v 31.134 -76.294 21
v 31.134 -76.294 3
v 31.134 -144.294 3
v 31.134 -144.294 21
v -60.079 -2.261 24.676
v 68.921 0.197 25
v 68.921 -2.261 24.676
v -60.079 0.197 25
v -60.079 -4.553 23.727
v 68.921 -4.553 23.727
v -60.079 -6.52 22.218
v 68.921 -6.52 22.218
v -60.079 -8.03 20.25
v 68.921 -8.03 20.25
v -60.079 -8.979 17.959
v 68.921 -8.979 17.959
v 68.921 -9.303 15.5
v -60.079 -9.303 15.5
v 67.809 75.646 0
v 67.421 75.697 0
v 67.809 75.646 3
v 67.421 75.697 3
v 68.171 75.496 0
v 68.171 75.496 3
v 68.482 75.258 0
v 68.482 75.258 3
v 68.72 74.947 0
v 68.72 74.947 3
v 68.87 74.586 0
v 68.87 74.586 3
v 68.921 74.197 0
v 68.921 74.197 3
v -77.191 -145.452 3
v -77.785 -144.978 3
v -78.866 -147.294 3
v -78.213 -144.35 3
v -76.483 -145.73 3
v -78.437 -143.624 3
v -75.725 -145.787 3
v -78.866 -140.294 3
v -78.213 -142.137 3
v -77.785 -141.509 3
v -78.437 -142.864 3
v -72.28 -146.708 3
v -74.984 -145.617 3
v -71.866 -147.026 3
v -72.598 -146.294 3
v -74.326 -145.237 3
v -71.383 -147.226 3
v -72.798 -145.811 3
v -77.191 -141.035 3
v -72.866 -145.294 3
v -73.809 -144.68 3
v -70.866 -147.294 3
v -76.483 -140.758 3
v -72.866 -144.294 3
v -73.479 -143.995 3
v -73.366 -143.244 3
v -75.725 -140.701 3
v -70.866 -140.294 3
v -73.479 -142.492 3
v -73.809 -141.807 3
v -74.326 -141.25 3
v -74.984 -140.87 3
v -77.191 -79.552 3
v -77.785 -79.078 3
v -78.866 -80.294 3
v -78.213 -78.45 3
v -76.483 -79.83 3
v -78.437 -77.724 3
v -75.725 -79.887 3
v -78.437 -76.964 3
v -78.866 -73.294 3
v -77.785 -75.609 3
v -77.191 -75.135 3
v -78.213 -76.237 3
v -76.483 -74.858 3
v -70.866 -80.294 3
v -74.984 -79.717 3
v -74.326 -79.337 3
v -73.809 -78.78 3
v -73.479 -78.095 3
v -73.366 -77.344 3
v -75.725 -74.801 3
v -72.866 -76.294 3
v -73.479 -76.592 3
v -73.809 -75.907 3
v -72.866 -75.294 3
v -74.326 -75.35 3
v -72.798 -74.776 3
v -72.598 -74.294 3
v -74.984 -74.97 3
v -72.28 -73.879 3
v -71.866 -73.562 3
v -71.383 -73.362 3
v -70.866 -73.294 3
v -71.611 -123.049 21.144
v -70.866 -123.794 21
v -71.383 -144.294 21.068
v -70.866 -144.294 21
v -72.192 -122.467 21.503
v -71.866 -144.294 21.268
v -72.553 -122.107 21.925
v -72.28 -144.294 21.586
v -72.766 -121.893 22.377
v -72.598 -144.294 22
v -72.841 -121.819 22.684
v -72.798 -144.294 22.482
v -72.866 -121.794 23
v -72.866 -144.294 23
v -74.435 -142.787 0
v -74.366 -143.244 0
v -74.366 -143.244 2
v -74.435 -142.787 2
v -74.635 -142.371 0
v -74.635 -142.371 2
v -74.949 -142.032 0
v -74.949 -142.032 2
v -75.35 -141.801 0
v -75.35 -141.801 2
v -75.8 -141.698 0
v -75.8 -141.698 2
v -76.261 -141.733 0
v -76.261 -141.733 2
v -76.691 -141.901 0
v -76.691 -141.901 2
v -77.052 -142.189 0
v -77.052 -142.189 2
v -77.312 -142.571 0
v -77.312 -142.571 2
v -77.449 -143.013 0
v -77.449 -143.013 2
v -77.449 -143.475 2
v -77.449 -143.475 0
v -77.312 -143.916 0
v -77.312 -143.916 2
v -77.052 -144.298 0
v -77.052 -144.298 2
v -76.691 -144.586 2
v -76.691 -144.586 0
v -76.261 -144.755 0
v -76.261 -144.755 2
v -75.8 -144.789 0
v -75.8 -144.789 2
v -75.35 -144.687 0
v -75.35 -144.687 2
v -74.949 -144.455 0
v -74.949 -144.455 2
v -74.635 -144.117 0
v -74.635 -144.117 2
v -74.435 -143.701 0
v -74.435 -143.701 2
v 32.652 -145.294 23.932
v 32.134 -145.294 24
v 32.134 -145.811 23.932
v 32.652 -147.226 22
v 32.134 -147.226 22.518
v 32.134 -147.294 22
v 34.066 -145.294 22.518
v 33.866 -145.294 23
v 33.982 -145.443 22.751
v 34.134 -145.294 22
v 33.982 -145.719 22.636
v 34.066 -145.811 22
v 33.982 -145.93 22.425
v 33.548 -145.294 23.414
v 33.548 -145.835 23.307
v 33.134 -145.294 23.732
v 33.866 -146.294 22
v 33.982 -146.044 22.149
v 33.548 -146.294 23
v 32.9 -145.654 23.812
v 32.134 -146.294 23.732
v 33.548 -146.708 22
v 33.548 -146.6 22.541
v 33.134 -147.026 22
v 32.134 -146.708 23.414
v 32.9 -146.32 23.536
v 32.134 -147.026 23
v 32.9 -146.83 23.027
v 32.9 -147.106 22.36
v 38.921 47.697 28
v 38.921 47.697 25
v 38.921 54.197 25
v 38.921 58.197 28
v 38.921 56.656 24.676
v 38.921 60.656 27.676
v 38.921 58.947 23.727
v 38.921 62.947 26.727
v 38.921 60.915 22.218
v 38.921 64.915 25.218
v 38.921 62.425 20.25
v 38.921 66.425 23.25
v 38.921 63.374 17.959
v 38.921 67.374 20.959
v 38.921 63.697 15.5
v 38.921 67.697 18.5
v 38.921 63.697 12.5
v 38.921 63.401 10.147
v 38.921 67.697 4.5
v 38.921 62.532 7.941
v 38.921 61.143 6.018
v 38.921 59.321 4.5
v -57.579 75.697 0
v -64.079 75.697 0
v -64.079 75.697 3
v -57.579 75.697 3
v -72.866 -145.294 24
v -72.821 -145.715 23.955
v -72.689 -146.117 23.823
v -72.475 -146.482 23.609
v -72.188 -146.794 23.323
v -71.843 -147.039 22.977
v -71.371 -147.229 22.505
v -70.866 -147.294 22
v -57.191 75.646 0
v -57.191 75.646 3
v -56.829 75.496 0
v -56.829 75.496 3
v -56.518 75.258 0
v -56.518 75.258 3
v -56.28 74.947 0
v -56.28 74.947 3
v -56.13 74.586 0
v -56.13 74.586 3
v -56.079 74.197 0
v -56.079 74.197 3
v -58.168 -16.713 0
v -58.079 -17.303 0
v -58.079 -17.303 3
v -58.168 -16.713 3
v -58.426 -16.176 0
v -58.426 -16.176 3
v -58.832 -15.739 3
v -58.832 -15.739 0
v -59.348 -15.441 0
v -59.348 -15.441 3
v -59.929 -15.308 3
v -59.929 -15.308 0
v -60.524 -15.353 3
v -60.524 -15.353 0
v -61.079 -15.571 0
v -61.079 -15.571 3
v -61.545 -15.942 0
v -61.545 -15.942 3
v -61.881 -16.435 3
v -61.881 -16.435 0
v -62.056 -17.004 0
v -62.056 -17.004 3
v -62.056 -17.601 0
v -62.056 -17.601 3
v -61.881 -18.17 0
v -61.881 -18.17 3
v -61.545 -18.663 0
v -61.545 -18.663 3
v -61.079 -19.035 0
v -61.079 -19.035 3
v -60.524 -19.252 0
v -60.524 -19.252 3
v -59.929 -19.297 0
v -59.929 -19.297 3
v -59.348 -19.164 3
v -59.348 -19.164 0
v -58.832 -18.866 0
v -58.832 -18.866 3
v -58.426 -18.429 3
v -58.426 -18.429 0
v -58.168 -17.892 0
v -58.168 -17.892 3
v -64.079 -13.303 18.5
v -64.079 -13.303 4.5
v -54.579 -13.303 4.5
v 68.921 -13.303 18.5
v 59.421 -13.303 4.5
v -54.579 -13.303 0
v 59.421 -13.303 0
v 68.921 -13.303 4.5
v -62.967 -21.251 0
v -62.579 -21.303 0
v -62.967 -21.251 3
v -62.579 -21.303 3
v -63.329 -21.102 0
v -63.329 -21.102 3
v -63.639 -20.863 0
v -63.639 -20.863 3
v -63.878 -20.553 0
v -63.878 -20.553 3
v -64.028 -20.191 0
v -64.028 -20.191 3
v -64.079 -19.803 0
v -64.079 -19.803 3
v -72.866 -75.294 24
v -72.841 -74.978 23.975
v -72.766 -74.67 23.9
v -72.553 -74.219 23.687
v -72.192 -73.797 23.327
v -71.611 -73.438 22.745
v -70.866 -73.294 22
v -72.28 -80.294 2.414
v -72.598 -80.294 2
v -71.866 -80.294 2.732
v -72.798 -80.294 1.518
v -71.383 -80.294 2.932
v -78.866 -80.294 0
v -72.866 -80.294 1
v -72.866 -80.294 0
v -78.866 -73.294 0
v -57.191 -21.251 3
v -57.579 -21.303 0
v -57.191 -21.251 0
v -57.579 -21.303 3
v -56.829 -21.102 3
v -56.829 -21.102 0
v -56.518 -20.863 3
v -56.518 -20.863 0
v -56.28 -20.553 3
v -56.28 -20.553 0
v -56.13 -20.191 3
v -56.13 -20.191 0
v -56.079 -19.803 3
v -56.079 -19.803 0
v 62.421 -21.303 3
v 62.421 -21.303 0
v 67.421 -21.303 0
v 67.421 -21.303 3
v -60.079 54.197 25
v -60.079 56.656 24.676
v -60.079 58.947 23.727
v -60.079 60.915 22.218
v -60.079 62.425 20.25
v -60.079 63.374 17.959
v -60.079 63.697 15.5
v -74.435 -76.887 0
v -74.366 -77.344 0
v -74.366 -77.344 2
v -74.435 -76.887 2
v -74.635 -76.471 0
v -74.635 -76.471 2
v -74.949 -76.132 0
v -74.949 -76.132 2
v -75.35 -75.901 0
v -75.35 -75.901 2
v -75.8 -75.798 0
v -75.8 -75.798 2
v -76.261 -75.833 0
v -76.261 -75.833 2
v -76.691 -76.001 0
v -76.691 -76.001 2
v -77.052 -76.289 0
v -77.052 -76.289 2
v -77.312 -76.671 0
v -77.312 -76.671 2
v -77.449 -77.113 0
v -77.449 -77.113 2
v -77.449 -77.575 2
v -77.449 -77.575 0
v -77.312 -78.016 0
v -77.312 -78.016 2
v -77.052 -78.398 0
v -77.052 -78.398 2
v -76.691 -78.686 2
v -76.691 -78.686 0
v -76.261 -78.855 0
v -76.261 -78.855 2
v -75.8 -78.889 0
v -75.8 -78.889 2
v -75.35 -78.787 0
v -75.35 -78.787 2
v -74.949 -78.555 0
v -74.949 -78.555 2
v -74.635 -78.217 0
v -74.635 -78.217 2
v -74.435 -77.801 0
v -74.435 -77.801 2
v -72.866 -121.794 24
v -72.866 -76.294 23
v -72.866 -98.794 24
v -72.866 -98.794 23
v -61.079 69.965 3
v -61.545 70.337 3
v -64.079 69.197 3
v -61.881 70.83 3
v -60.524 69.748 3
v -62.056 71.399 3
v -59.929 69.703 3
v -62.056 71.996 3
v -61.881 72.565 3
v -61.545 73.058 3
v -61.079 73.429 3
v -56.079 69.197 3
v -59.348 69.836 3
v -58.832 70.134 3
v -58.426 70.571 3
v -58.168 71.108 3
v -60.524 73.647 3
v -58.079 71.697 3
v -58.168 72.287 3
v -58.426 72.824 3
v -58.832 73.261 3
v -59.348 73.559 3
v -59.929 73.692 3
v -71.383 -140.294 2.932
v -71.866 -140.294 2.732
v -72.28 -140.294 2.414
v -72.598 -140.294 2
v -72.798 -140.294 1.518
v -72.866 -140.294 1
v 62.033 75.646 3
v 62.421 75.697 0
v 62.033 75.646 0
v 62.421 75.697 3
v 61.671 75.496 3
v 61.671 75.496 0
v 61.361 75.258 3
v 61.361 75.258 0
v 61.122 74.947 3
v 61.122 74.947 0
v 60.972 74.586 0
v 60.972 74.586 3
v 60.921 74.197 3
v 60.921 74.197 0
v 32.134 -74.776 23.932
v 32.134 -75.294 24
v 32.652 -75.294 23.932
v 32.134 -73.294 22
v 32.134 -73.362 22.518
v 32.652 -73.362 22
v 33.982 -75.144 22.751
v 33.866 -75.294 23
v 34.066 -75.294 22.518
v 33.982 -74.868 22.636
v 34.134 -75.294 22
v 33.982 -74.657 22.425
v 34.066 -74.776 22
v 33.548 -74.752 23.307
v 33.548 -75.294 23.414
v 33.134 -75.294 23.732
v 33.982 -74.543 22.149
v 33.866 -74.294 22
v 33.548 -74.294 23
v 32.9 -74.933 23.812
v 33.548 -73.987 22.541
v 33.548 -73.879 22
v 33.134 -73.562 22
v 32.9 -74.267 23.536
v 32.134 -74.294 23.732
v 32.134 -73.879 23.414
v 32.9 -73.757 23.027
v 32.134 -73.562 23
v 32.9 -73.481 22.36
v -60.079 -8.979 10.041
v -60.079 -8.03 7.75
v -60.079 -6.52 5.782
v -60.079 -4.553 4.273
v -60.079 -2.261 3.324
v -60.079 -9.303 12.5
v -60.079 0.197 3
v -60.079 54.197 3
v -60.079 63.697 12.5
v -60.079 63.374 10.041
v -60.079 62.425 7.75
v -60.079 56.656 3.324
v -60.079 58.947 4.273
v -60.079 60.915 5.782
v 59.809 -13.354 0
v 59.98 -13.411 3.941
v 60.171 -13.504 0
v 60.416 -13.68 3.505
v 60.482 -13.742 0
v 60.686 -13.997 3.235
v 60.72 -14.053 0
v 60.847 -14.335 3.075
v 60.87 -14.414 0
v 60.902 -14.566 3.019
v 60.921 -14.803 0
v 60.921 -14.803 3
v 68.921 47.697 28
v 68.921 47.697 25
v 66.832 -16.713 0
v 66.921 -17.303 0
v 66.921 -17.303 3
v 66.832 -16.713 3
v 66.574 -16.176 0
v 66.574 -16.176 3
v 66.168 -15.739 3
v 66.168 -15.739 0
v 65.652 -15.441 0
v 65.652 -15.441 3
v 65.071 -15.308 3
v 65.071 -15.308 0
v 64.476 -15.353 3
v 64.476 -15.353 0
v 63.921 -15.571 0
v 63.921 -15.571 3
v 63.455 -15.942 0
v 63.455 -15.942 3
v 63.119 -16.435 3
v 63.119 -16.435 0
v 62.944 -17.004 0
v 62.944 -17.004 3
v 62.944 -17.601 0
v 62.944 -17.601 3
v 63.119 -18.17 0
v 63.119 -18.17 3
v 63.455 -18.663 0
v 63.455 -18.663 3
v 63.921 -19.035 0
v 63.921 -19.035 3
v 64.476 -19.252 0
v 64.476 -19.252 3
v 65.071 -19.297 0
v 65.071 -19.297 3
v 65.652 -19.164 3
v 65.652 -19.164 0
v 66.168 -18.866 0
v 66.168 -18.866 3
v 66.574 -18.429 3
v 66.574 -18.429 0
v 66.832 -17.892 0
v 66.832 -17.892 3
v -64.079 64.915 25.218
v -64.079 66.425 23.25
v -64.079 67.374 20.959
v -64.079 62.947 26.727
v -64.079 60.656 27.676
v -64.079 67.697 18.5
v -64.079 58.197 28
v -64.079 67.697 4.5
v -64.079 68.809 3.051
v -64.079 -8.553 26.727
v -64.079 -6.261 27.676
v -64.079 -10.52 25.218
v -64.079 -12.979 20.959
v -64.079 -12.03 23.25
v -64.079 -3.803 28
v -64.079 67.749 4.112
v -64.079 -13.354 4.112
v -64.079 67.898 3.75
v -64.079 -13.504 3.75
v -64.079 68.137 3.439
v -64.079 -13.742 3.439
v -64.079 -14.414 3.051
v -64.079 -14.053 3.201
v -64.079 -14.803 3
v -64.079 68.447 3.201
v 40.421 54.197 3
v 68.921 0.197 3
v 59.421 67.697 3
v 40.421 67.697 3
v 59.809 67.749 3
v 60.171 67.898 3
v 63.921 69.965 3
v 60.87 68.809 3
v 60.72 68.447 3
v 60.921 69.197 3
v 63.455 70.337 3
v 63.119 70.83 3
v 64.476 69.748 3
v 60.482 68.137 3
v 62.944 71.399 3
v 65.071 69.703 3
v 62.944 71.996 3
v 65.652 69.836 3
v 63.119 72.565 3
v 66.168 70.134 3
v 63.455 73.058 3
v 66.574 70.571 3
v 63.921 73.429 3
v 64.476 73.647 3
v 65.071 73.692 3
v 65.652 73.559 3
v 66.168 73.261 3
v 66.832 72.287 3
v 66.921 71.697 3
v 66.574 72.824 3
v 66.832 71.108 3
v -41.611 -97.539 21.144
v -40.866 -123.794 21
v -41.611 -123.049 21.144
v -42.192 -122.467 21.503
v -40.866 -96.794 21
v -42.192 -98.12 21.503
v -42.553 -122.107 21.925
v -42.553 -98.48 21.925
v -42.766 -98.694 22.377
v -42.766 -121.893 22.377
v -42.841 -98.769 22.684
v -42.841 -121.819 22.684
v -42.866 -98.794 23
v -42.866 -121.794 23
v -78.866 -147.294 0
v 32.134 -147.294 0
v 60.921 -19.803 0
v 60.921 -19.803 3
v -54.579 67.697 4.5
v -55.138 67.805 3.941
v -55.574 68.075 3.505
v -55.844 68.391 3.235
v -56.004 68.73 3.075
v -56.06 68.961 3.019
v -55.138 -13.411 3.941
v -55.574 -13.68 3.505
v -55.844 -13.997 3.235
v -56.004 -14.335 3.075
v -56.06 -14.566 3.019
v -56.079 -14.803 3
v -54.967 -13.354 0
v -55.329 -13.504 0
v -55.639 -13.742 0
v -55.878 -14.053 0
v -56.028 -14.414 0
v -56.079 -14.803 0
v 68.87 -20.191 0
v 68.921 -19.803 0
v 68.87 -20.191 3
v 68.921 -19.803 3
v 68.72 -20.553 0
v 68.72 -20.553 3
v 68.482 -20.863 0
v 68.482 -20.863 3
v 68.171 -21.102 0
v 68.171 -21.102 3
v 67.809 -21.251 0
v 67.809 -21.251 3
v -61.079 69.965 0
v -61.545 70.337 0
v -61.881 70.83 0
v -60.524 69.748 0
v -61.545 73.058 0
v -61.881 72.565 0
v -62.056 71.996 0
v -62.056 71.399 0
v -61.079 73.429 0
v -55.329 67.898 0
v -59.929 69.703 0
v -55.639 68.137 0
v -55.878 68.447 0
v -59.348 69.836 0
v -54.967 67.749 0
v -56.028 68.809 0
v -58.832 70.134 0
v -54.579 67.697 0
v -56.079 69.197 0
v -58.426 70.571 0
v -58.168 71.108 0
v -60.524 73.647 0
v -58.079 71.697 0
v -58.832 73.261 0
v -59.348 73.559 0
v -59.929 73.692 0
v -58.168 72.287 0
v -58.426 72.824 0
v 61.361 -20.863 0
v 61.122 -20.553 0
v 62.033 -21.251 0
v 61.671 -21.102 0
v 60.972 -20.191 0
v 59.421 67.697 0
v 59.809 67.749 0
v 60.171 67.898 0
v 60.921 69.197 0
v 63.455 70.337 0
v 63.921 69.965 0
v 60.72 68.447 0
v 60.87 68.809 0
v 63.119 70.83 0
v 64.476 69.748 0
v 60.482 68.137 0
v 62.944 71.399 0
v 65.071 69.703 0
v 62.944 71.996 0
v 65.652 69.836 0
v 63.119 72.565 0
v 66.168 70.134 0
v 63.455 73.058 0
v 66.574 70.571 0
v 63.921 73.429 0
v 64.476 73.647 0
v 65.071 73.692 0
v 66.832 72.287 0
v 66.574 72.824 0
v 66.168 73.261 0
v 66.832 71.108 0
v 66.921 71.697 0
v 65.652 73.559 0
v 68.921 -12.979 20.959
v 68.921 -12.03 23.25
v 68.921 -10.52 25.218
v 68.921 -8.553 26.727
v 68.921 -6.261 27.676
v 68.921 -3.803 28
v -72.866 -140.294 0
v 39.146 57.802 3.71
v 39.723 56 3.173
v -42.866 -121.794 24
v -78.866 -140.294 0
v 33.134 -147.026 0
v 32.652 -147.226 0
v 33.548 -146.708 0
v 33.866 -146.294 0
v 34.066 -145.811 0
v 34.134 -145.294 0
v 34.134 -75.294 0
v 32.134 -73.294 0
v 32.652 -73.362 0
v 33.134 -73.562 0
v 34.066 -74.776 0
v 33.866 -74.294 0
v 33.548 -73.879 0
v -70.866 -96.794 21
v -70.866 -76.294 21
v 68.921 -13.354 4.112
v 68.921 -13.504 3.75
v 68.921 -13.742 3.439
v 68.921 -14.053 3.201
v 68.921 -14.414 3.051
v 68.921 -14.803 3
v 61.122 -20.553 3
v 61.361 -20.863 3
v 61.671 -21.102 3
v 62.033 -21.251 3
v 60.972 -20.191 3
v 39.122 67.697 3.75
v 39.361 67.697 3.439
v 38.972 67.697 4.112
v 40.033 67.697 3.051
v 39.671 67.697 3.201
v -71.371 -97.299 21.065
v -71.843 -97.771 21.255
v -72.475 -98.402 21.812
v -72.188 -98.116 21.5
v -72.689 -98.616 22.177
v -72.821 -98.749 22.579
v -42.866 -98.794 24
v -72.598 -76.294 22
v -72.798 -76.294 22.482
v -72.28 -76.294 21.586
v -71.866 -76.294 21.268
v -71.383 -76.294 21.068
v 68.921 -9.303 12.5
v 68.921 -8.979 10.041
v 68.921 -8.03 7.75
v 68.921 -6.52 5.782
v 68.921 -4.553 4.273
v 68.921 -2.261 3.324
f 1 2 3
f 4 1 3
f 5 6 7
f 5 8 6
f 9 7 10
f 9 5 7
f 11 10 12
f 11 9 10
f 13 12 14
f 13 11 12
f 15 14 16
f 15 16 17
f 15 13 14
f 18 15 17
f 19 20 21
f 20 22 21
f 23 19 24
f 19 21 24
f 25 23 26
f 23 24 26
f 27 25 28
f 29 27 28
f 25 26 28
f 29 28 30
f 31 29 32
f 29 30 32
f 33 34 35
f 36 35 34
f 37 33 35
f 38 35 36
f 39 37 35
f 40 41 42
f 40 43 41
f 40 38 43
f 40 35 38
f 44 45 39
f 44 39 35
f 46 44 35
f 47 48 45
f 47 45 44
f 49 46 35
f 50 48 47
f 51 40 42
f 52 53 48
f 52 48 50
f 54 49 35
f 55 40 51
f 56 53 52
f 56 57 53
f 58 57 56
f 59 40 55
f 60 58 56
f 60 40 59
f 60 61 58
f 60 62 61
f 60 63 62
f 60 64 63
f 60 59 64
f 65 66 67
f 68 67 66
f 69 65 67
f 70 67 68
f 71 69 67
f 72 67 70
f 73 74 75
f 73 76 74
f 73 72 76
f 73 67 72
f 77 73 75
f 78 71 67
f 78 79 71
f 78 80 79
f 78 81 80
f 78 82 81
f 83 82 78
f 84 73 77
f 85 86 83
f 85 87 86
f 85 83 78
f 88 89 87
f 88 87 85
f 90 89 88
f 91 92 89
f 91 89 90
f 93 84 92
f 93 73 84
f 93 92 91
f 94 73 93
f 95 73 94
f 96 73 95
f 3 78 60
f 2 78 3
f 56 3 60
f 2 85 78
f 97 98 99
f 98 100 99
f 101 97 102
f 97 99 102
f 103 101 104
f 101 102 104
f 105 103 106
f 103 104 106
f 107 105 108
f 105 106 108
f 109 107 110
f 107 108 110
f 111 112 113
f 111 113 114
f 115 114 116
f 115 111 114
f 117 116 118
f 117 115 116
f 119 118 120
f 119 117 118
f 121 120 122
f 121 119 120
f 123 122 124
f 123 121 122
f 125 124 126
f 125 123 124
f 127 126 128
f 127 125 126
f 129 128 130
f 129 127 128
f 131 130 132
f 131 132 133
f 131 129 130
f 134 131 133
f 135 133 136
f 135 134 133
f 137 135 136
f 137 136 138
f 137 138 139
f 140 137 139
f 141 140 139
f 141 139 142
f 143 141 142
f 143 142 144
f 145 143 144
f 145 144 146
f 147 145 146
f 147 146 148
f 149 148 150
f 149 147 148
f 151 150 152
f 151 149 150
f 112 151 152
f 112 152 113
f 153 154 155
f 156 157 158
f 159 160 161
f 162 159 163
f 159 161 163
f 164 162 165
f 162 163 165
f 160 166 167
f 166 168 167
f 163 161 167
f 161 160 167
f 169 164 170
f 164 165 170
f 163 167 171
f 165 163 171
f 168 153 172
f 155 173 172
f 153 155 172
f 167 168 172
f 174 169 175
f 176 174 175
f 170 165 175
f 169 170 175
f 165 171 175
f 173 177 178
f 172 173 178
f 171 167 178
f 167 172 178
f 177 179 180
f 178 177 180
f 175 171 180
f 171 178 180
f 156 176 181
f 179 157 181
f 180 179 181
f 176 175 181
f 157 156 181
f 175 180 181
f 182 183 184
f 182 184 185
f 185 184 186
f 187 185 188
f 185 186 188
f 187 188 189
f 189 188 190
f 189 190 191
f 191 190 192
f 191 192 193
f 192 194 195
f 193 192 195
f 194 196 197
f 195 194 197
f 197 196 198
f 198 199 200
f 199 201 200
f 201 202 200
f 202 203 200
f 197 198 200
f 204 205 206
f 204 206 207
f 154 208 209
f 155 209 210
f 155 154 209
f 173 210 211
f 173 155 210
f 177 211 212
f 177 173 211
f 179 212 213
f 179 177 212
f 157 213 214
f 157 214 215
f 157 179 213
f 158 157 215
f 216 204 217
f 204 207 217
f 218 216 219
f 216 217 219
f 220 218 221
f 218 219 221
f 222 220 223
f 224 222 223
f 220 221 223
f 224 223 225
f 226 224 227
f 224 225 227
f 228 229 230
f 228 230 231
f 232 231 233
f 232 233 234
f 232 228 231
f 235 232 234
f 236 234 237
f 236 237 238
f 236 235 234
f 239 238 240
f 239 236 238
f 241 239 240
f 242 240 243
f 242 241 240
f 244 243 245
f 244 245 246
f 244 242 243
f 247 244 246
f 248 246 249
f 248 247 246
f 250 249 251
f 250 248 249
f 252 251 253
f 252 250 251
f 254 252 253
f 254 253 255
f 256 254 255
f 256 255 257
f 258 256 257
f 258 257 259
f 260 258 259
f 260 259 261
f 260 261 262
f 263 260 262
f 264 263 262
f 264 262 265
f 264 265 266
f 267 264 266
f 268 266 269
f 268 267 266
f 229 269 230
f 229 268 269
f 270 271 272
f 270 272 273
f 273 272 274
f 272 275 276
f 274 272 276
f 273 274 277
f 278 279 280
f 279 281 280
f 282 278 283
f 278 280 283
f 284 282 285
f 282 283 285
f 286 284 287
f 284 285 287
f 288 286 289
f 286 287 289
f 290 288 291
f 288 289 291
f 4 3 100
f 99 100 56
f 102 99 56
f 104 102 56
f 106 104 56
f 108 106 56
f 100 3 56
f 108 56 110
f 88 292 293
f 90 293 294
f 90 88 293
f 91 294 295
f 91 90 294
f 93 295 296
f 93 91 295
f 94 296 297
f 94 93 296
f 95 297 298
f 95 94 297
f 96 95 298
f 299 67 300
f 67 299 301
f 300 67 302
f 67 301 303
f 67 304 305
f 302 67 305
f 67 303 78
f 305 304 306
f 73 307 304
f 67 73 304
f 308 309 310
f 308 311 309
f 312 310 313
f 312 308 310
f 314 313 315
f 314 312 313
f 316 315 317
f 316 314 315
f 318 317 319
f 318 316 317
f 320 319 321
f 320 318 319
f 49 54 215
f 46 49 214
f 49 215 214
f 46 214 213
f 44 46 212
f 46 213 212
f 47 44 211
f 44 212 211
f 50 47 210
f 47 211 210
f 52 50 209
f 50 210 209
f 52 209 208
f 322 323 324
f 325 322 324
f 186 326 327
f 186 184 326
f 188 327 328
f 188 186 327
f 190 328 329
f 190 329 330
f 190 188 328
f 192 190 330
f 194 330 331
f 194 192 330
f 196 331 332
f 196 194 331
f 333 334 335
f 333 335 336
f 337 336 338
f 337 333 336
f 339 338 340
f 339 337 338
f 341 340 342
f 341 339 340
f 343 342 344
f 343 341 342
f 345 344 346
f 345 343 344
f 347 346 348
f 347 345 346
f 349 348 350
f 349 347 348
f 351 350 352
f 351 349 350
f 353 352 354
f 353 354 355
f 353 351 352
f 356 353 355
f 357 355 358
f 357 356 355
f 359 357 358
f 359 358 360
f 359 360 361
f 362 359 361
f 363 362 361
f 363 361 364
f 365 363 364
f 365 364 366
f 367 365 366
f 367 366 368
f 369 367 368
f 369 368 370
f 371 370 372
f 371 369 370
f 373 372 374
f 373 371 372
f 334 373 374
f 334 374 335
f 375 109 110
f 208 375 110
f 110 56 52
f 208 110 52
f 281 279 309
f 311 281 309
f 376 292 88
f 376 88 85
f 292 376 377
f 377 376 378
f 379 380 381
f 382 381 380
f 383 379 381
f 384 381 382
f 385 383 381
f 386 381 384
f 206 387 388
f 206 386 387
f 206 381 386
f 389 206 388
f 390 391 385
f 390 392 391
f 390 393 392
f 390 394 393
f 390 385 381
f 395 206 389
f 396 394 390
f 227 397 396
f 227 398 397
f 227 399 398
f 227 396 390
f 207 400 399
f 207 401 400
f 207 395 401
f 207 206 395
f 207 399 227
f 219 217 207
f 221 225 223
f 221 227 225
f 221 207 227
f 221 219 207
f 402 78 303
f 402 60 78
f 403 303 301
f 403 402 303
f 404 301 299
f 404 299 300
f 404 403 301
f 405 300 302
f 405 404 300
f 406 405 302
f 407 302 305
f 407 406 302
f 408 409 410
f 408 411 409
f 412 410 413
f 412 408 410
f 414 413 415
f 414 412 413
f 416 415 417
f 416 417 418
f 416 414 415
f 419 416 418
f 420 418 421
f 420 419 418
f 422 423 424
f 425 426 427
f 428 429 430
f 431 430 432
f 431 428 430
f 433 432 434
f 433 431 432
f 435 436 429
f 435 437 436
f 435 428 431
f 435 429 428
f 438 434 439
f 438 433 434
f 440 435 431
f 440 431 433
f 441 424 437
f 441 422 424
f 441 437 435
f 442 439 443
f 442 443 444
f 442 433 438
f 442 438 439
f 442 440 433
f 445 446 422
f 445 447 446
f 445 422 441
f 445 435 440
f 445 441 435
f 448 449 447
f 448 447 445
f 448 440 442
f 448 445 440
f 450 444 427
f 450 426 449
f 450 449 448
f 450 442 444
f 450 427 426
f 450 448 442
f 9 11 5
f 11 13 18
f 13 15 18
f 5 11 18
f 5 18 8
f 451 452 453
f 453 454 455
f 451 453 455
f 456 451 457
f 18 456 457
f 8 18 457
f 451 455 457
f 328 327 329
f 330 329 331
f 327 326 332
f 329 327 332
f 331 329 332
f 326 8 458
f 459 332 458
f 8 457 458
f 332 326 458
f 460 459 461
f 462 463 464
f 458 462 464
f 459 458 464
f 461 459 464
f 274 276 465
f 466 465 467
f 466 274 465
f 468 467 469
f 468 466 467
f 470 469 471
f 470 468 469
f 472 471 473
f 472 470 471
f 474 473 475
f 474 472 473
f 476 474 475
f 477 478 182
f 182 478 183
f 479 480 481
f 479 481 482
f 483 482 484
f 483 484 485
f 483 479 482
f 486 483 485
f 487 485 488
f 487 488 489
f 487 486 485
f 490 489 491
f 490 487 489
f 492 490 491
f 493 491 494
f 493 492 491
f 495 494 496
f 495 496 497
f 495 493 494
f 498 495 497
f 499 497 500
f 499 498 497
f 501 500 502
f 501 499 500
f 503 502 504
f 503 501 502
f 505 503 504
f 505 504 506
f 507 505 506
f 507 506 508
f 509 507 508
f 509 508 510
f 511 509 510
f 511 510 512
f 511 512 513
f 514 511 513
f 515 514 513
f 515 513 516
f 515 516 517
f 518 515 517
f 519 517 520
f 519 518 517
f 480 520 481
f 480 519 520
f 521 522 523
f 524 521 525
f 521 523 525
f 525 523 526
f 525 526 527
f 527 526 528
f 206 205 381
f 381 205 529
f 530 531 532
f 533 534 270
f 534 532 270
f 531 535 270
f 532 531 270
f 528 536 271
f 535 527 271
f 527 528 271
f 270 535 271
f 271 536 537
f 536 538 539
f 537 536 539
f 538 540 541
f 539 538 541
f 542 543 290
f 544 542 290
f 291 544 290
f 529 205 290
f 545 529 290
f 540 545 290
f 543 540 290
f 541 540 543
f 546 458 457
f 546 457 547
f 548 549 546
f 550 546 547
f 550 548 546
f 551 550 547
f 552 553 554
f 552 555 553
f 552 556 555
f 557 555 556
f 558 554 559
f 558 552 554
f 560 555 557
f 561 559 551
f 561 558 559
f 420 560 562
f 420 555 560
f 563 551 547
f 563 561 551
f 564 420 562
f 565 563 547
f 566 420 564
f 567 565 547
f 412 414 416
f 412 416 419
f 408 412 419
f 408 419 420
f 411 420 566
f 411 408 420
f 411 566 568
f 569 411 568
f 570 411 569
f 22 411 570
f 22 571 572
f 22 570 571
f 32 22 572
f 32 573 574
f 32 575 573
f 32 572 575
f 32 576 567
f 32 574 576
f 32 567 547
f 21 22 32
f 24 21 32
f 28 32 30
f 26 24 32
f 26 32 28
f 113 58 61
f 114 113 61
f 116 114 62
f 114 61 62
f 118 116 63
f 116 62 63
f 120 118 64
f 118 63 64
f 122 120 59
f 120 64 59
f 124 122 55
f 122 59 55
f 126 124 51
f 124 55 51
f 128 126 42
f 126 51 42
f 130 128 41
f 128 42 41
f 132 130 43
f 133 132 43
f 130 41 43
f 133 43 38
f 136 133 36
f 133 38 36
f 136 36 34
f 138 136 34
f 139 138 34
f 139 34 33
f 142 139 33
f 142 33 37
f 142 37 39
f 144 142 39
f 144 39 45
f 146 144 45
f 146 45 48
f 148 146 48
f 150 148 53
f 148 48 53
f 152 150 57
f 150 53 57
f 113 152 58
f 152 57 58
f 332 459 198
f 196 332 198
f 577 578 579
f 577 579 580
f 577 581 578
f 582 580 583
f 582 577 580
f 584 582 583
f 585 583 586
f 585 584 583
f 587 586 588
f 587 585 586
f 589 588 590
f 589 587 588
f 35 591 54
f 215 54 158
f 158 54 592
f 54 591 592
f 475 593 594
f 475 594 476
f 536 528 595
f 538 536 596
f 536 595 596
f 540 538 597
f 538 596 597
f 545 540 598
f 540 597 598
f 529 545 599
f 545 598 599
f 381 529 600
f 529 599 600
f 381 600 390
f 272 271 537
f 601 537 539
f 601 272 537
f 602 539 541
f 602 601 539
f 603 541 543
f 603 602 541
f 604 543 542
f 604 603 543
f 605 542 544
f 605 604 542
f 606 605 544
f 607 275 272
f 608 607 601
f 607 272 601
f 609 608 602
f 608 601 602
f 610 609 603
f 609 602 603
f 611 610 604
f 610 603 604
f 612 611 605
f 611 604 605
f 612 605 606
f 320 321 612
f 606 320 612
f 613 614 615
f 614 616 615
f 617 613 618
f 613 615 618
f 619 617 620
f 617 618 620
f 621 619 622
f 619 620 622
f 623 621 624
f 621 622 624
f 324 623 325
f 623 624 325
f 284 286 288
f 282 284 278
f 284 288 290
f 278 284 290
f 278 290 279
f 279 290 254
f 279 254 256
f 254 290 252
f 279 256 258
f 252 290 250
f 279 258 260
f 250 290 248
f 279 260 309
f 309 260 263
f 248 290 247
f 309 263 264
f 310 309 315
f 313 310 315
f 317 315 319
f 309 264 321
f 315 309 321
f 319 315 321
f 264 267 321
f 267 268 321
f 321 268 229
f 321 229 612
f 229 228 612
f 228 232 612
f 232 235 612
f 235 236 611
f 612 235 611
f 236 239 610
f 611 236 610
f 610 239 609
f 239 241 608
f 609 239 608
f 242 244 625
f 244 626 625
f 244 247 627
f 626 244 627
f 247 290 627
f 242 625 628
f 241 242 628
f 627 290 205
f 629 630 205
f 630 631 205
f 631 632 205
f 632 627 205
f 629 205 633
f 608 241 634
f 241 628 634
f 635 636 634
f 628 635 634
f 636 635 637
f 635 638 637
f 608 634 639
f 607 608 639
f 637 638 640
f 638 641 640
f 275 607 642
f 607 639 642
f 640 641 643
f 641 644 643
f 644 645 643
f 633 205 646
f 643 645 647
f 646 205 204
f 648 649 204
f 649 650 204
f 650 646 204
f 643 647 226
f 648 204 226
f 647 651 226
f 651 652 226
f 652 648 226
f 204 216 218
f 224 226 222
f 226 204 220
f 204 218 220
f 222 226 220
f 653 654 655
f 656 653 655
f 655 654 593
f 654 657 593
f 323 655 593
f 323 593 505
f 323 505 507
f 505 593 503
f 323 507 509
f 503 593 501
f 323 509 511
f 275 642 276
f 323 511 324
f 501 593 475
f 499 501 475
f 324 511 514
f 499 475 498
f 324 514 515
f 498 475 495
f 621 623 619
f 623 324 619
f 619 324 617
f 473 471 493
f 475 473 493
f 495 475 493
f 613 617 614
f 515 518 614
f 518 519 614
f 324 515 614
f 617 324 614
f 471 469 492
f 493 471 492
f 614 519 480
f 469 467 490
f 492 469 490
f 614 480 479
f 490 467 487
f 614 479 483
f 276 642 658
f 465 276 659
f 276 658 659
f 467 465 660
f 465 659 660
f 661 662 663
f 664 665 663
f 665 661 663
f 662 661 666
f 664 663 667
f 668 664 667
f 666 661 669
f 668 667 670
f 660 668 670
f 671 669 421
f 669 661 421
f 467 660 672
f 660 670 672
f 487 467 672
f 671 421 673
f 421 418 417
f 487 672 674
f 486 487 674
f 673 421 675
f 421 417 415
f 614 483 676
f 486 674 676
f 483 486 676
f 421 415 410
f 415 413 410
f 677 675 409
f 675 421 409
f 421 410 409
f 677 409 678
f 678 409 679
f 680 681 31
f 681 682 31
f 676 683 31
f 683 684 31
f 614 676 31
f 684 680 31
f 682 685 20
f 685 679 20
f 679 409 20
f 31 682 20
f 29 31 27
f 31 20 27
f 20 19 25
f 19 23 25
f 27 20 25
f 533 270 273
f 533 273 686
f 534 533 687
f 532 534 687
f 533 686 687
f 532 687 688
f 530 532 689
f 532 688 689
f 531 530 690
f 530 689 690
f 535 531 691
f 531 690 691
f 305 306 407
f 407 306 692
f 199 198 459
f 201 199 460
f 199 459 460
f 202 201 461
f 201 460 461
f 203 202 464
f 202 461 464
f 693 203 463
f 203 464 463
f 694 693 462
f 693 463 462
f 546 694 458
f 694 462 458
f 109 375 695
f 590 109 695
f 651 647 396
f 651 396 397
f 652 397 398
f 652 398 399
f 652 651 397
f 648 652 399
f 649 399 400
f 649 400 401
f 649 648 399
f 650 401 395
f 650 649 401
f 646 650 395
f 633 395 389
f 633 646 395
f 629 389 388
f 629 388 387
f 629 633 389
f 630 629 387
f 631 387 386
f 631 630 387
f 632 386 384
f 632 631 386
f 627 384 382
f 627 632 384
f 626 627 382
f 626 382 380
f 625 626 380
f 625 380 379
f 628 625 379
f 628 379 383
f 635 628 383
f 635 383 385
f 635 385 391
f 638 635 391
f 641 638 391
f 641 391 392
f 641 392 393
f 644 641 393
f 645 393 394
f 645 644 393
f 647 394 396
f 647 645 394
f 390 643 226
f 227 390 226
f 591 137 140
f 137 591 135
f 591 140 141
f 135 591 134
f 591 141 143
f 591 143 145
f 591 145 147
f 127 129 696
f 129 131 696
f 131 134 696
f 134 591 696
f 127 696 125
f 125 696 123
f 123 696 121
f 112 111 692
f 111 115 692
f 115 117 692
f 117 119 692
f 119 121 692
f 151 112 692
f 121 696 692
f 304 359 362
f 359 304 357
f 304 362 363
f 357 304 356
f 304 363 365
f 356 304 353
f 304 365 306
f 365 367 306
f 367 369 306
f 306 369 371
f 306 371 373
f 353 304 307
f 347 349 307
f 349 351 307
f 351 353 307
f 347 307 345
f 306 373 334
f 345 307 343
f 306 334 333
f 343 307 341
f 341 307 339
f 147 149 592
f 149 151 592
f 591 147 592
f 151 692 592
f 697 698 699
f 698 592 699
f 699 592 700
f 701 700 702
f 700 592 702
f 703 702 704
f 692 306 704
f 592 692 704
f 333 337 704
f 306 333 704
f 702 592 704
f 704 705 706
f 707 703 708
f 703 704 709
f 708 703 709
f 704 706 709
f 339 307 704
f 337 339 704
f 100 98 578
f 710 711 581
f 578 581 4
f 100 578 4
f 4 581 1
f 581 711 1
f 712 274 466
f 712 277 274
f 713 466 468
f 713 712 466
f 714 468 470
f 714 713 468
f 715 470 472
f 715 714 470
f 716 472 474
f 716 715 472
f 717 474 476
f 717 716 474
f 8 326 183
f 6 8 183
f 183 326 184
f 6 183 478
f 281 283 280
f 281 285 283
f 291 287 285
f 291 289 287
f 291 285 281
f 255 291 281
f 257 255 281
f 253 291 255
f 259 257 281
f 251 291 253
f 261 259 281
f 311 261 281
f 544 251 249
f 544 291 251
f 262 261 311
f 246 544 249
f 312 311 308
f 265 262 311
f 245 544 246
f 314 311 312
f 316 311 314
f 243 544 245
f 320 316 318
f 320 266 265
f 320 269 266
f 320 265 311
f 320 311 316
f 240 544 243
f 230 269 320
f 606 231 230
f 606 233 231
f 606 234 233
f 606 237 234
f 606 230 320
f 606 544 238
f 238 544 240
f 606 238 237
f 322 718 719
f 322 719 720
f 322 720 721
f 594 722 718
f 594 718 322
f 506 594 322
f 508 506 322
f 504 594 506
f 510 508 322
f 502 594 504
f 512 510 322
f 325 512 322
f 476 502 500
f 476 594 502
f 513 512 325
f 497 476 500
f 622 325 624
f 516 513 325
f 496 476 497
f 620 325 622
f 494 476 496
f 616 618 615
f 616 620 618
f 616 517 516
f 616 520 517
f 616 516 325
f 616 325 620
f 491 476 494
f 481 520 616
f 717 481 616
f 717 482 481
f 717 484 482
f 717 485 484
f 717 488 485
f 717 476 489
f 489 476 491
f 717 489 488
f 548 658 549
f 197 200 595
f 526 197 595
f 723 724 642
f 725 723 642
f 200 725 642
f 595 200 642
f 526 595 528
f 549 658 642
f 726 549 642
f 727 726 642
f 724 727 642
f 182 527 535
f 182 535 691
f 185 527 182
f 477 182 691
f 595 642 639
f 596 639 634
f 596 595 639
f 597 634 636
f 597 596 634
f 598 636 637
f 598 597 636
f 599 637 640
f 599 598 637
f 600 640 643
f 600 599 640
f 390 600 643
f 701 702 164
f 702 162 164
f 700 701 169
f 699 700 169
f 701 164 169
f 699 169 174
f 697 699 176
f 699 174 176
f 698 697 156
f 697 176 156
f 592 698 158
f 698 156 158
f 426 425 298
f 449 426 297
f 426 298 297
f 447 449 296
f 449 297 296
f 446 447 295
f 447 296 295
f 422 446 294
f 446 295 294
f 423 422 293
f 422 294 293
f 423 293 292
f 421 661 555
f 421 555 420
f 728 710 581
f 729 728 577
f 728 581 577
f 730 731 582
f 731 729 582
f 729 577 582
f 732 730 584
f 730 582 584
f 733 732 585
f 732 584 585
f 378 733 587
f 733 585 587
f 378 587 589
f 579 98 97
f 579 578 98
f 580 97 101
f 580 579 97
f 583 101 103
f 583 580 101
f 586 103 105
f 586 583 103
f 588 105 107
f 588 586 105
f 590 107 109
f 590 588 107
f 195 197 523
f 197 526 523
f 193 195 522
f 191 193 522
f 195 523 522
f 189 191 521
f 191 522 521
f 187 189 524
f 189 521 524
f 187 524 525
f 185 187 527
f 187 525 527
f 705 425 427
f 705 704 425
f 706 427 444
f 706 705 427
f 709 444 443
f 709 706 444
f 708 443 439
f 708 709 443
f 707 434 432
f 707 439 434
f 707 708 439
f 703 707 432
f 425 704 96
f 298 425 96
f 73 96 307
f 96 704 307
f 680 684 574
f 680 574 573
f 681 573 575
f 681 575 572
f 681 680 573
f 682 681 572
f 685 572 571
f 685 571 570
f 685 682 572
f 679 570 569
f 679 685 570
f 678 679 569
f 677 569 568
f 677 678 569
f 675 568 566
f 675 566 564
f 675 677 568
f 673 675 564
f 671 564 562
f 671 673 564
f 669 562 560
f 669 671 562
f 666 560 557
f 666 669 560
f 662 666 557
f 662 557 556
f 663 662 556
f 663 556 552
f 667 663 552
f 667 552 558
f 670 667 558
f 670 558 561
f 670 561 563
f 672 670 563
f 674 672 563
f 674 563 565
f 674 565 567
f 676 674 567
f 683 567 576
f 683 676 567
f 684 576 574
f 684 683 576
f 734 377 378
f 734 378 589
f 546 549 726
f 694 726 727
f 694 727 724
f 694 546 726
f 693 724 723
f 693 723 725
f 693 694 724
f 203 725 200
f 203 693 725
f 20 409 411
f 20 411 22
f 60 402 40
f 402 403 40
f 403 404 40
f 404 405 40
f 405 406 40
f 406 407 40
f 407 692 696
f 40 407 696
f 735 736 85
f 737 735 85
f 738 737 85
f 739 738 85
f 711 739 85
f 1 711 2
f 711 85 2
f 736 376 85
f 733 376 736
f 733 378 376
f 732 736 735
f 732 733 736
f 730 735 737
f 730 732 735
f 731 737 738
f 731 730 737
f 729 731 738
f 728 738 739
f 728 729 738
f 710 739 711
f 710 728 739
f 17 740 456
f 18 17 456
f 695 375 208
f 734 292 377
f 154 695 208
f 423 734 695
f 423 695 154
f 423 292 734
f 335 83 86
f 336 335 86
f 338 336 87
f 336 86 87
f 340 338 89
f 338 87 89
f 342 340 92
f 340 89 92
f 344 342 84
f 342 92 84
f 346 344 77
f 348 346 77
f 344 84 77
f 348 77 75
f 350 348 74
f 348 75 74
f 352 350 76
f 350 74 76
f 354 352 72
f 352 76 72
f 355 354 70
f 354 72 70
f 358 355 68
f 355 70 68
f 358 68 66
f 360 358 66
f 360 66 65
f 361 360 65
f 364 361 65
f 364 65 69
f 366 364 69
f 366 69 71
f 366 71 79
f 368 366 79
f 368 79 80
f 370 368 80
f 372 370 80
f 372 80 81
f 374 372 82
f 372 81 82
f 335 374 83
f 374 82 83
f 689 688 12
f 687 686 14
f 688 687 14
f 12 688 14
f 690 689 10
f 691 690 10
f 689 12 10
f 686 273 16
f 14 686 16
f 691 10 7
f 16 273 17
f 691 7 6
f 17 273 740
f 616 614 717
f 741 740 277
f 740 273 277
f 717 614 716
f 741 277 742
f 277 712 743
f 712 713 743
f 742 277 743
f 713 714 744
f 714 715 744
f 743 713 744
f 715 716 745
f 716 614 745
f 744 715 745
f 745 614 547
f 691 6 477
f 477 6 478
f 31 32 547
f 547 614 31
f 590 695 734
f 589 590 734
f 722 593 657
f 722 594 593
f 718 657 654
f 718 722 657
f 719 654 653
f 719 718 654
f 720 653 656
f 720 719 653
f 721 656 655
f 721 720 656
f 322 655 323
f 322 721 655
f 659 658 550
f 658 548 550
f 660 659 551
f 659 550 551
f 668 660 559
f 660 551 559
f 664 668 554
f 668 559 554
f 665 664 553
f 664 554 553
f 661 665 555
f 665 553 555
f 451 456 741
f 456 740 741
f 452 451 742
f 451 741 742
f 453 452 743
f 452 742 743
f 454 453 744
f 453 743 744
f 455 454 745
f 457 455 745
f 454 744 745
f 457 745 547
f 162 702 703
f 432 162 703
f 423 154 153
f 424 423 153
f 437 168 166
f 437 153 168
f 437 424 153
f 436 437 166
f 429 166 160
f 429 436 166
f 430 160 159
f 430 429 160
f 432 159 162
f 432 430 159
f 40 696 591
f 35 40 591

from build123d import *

# Parameters (mm, degrees)
F1_DEPTH  = 25
F0_W      = 8
F0_H      = 8
F0_R      = 2
F0_W_2    = 26
F0_H_2    = 16
F0_W_3    = 4
F0_H_3    = 57
F2_DEPTH  = 3
F3_START  = 25
F3_DEPTH  = 3
F4_R      = 1.5
F5_R      = 9.5
F6_R      = 1.55
F7_DEPTH  = 3
F8_DEPTH  = 21
F9_START  = 21
F9_DEPTH  = 3
F10_W     = 30
F10_H     = 23
F11_DEPTH = 3
F12_R     = 2
F13_SIZE  = 1


with BuildPart() as f1:
    # F0 (on Top) → F1 (new body)
    with BuildSketch(Plane.XY):
        Polygon((-60.0788152814, -9.3025659323), (-60.0788152814, 63.6974340677), (38.9211847186, 63.6974340677), (38.9211847186, 67.6974340677), (-56.0788152814, 67.6974340677), (-64.0788152814, 67.6974340677), (-64.0788152814, -13.3025659323), (-56.0788152814, -13.3025659323), (60.9211847186, -13.3025659323), (68.9211847186, -13.3025659323), (68.9211847186, -9.3025659323), (64.9211847186, -9.3025659323), align=None)
    extrude(amount=F1_DEPTH)

    # F0 (on Top) → F2 (join)
    with BuildSketch(Plane.XY):
        with Locations((-60.0788152814, 71.6974340677)):
            Rectangle(F0_W, F0_H)
        with Locations((-60.0788152814, 71.6974340677)):
            Circle(F0_R, mode=Mode.SUBTRACT)
        with Locations((64.9211847186, 71.6974340677)):
            Rectangle(F0_W, F0_H)
        with Locations((64.9211847186, 71.6974340677)):
            Circle(F0_R, mode=Mode.SUBTRACT)
        Polygon((38.9211847186, 67.6974340677), (38.9211847186, 63.6974340677), (64.9211847186, 63.6974340677), (68.9211847186, 63.6974340677), (68.9211847186, 67.6974340677), (60.9211847186, 67.6974340677), align=None)
        with Locations((51.9211847186, 55.6974340677)):
            Rectangle(F0_W_2, F0_H_2)
        with Locations((66.9211847186, 55.6974340677)):
            Rectangle(F0_W_3, F0_H_2)
        with Locations((66.9211847186, 19.1974340677)):
            Rectangle(F0_W_3, F0_H_3)
        Polygon((38.9211847186, 63.6974340677), (-60.0788152814, 63.6974340677), (-60.0788152814, -9.3025659323), (64.9211847186, -9.3025659323), (64.9211847186, 47.6974340677), (38.9211847186, 47.6974340677), align=None)
        with Locations((64.9211847186, -17.3025659323)):
            Rectangle(F0_W, F0_H)
        with Locations((64.9211847186, -17.3025659323)):
            Circle(F0_R, mode=Mode.SUBTRACT)
        with Locations((-60.0788152814, -17.3025659323)):
            Rectangle(F0_W, F0_H)
        with Locations((-60.0788152814, -17.3025659323)):
            Circle(F0_R, mode=Mode.SUBTRACT)
    extrude(amount=F2_DEPTH)

    # F0 (on Top) → F3 (join)
    with BuildSketch(Plane.XY.offset(F3_START)):
        Polygon((-60.0788152814, -9.3025659323), (-60.0788152814, 63.6974340677), (38.9211847186, 63.6974340677), (38.9211847186, 67.6974340677), (-56.0788152814, 67.6974340677), (-64.0788152814, 67.6974340677), (-64.0788152814, -13.3025659323), (-56.0788152814, -13.3025659323), (60.9211847186, -13.3025659323), (68.9211847186, -13.3025659323), (68.9211847186, -9.3025659323), (64.9211847186, -9.3025659323), align=None)
        Polygon((38.9211847186, 63.6974340677), (-60.0788152814, 63.6974340677), (-60.0788152814, -9.3025659323), (64.9211847186, -9.3025659323), (64.9211847186, 47.6974340677), (38.9211847186, 47.6974340677), align=None)
        with Locations((66.9211847186, 19.1974340677)):
            Rectangle(F0_W_3, F0_H_3)
    extrude(amount=F3_DEPTH)

    # F4
    f4_edges = [f1.edges().sort_by_distance(p)[0] for p in [
        (64.921185, -13.302566, 3),
        (-60.078815, -13.302566, 3),
        (-60.078815, 67.697434, 3),
        (60.921185, 67.697434, 1.5),
        (-56.078815, 67.697434, 1.5),
        (-56.078815, -13.302566, 1.5),
        (60.921185, -13.302566, 1.5),
        (38.921185, 65.697434, 3),
        (-56.078815, 75.697434, 1.5),
        (-56.078815, -21.302566, 1.5),
        (-64.078815, -21.302566, 1.5),
        (60.921185, -21.302566, 1.5),
        (68.921185, -21.302566, 1.5),
        (68.921185, 75.697434, 1.5),
        (60.921185, 75.697434, 1.5),
    ]]
    fillet(f4_edges, radius=F4_R)

    # F5
    f5_edges = [f1.edges().sort_by_distance(p)[0] for p in [
        (-10.578815, 63.697434, 25),
        (-10.578815, 63.697434, 3),
        (4.421185, -9.302566, 3),
        (4.421185, -9.302566, 25),
        (2.421185, -13.302566, 28),
        (-12.578815, 67.697434, 28),
    ]]
    fillet(f5_edges, radius=F5_R)


with BuildPart() as f7:
    # F6 (on Top) → F7 (new body)
    with BuildSketch(Plane.XY):
        Polygon((31.1341558844, -76.2936508735), (-72.8658441156, -76.2936508735), (-72.8658441156, -80.2936508735), (-72.8658441156, -140.2936508735), (-72.8658441156, -144.2936508735), (31.1341558844, -144.2936508735), align=None)
        Polygon((-72.8658441156, -73.2936508735), (-72.8658441156, -76.2936508735), (31.1341558844, -76.2936508735), (31.1341558844, -144.2936508735), (-72.8658441156, -144.2936508735), (-72.8658441156, -147.2936508735), (34.1341558844, -147.2936508735), (34.1341558844, -73.2936508735), align=None)
        Polygon((-72.8658441156, -80.2936508735), (-72.8658441156, -76.2936508735), (-72.8658441156, -73.2936508735), (-78.8658441156, -73.2936508735), (-78.8658441156, -80.2936508735), align=None)
        with Locations((-75.9158441156, -77.3436508735)):
            Circle(F6_R, mode=Mode.SUBTRACT)
        Polygon((-72.8658441156, -144.2936508735), (-72.8658441156, -140.2936508735), (-78.8658441156, -140.2936508735), (-78.8658441156, -147.2936508735), (-72.8658441156, -147.2936508735), align=None)
        with Locations((-75.9158441156, -143.2436508735)):
            Circle(F6_R, mode=Mode.SUBTRACT)
    extrude(amount=F7_DEPTH)

    # F6 (on Top) → F8 (join)
    with BuildSketch(Plane.XY):
        Polygon((-72.8658441156, -73.2936508735), (-72.8658441156, -76.2936508735), (31.1341558844, -76.2936508735), (31.1341558844, -144.2936508735), (-72.8658441156, -144.2936508735), (-72.8658441156, -147.2936508735), (34.1341558844, -147.2936508735), (34.1341558844, -73.2936508735), align=None)
    extrude(amount=F8_DEPTH)

    # F6 (on Top) → F9 (join)
    with BuildSketch(Plane.XY.offset(F9_START)):
        Polygon((-72.8658441156, -73.2936508735), (-72.8658441156, -76.2936508735), (31.1341558844, -76.2936508735), (31.1341558844, -144.2936508735), (-72.8658441156, -144.2936508735), (-72.8658441156, -147.2936508735), (34.1341558844, -147.2936508735), (34.1341558844, -73.2936508735), align=None)
        Polygon((31.1341558844, -76.2936508735), (-72.8658441156, -76.2936508735), (-72.8658441156, -80.2936508735), (-72.8658441156, -140.2936508735), (-72.8658441156, -144.2936508735), (31.1341558844, -144.2936508735), align=None)
    extrude(amount=F9_DEPTH)

    # F10 (on face) → F11 (cut)
    with BuildSketch(Plane.XY.offset(24)):
        with Locations((-57.8658441156, -110.2936508735)):
            Rectangle(F10_W, F10_H)
    extrude(amount=-F11_DEPTH, mode=Mode.SUBTRACT)

    # F12
    f12_edges = [f7.edges().sort_by_distance(p)[0] for p in [
        (-19.365844, -73.293651, 24),
        (-19.365844, -147.293651, 24),
        (34.134156, -110.293651, 24),
        (34.134156, -147.293651, 12),
        (34.134156, -73.293651, 12),
        (-72.865844, -147.293651, 13.5),
        (-72.865844, -73.293651, 13.5),
        (-72.865844, -133.043651, 21),
        (-72.865844, -87.543651, 21),
        (-57.865844, -98.793651, 21),
        (-57.865844, -121.793651, 21),
        (-42.865844, -110.293651, 21),
        (-72.865844, -110.293651, 3),
    ]]
    fillet(f12_edges, radius=F12_R)

    # F13
    f13_edges = [f7.edges().sort_by_distance(p)[0] for p in [
        (-77.465844, -77.343651, 3),
        (-77.465844, -143.243651, 3),
    ]]
    chamfer(f13_edges, length=F13_SIZE)


solid = Compound([f1.part, f7.part])
